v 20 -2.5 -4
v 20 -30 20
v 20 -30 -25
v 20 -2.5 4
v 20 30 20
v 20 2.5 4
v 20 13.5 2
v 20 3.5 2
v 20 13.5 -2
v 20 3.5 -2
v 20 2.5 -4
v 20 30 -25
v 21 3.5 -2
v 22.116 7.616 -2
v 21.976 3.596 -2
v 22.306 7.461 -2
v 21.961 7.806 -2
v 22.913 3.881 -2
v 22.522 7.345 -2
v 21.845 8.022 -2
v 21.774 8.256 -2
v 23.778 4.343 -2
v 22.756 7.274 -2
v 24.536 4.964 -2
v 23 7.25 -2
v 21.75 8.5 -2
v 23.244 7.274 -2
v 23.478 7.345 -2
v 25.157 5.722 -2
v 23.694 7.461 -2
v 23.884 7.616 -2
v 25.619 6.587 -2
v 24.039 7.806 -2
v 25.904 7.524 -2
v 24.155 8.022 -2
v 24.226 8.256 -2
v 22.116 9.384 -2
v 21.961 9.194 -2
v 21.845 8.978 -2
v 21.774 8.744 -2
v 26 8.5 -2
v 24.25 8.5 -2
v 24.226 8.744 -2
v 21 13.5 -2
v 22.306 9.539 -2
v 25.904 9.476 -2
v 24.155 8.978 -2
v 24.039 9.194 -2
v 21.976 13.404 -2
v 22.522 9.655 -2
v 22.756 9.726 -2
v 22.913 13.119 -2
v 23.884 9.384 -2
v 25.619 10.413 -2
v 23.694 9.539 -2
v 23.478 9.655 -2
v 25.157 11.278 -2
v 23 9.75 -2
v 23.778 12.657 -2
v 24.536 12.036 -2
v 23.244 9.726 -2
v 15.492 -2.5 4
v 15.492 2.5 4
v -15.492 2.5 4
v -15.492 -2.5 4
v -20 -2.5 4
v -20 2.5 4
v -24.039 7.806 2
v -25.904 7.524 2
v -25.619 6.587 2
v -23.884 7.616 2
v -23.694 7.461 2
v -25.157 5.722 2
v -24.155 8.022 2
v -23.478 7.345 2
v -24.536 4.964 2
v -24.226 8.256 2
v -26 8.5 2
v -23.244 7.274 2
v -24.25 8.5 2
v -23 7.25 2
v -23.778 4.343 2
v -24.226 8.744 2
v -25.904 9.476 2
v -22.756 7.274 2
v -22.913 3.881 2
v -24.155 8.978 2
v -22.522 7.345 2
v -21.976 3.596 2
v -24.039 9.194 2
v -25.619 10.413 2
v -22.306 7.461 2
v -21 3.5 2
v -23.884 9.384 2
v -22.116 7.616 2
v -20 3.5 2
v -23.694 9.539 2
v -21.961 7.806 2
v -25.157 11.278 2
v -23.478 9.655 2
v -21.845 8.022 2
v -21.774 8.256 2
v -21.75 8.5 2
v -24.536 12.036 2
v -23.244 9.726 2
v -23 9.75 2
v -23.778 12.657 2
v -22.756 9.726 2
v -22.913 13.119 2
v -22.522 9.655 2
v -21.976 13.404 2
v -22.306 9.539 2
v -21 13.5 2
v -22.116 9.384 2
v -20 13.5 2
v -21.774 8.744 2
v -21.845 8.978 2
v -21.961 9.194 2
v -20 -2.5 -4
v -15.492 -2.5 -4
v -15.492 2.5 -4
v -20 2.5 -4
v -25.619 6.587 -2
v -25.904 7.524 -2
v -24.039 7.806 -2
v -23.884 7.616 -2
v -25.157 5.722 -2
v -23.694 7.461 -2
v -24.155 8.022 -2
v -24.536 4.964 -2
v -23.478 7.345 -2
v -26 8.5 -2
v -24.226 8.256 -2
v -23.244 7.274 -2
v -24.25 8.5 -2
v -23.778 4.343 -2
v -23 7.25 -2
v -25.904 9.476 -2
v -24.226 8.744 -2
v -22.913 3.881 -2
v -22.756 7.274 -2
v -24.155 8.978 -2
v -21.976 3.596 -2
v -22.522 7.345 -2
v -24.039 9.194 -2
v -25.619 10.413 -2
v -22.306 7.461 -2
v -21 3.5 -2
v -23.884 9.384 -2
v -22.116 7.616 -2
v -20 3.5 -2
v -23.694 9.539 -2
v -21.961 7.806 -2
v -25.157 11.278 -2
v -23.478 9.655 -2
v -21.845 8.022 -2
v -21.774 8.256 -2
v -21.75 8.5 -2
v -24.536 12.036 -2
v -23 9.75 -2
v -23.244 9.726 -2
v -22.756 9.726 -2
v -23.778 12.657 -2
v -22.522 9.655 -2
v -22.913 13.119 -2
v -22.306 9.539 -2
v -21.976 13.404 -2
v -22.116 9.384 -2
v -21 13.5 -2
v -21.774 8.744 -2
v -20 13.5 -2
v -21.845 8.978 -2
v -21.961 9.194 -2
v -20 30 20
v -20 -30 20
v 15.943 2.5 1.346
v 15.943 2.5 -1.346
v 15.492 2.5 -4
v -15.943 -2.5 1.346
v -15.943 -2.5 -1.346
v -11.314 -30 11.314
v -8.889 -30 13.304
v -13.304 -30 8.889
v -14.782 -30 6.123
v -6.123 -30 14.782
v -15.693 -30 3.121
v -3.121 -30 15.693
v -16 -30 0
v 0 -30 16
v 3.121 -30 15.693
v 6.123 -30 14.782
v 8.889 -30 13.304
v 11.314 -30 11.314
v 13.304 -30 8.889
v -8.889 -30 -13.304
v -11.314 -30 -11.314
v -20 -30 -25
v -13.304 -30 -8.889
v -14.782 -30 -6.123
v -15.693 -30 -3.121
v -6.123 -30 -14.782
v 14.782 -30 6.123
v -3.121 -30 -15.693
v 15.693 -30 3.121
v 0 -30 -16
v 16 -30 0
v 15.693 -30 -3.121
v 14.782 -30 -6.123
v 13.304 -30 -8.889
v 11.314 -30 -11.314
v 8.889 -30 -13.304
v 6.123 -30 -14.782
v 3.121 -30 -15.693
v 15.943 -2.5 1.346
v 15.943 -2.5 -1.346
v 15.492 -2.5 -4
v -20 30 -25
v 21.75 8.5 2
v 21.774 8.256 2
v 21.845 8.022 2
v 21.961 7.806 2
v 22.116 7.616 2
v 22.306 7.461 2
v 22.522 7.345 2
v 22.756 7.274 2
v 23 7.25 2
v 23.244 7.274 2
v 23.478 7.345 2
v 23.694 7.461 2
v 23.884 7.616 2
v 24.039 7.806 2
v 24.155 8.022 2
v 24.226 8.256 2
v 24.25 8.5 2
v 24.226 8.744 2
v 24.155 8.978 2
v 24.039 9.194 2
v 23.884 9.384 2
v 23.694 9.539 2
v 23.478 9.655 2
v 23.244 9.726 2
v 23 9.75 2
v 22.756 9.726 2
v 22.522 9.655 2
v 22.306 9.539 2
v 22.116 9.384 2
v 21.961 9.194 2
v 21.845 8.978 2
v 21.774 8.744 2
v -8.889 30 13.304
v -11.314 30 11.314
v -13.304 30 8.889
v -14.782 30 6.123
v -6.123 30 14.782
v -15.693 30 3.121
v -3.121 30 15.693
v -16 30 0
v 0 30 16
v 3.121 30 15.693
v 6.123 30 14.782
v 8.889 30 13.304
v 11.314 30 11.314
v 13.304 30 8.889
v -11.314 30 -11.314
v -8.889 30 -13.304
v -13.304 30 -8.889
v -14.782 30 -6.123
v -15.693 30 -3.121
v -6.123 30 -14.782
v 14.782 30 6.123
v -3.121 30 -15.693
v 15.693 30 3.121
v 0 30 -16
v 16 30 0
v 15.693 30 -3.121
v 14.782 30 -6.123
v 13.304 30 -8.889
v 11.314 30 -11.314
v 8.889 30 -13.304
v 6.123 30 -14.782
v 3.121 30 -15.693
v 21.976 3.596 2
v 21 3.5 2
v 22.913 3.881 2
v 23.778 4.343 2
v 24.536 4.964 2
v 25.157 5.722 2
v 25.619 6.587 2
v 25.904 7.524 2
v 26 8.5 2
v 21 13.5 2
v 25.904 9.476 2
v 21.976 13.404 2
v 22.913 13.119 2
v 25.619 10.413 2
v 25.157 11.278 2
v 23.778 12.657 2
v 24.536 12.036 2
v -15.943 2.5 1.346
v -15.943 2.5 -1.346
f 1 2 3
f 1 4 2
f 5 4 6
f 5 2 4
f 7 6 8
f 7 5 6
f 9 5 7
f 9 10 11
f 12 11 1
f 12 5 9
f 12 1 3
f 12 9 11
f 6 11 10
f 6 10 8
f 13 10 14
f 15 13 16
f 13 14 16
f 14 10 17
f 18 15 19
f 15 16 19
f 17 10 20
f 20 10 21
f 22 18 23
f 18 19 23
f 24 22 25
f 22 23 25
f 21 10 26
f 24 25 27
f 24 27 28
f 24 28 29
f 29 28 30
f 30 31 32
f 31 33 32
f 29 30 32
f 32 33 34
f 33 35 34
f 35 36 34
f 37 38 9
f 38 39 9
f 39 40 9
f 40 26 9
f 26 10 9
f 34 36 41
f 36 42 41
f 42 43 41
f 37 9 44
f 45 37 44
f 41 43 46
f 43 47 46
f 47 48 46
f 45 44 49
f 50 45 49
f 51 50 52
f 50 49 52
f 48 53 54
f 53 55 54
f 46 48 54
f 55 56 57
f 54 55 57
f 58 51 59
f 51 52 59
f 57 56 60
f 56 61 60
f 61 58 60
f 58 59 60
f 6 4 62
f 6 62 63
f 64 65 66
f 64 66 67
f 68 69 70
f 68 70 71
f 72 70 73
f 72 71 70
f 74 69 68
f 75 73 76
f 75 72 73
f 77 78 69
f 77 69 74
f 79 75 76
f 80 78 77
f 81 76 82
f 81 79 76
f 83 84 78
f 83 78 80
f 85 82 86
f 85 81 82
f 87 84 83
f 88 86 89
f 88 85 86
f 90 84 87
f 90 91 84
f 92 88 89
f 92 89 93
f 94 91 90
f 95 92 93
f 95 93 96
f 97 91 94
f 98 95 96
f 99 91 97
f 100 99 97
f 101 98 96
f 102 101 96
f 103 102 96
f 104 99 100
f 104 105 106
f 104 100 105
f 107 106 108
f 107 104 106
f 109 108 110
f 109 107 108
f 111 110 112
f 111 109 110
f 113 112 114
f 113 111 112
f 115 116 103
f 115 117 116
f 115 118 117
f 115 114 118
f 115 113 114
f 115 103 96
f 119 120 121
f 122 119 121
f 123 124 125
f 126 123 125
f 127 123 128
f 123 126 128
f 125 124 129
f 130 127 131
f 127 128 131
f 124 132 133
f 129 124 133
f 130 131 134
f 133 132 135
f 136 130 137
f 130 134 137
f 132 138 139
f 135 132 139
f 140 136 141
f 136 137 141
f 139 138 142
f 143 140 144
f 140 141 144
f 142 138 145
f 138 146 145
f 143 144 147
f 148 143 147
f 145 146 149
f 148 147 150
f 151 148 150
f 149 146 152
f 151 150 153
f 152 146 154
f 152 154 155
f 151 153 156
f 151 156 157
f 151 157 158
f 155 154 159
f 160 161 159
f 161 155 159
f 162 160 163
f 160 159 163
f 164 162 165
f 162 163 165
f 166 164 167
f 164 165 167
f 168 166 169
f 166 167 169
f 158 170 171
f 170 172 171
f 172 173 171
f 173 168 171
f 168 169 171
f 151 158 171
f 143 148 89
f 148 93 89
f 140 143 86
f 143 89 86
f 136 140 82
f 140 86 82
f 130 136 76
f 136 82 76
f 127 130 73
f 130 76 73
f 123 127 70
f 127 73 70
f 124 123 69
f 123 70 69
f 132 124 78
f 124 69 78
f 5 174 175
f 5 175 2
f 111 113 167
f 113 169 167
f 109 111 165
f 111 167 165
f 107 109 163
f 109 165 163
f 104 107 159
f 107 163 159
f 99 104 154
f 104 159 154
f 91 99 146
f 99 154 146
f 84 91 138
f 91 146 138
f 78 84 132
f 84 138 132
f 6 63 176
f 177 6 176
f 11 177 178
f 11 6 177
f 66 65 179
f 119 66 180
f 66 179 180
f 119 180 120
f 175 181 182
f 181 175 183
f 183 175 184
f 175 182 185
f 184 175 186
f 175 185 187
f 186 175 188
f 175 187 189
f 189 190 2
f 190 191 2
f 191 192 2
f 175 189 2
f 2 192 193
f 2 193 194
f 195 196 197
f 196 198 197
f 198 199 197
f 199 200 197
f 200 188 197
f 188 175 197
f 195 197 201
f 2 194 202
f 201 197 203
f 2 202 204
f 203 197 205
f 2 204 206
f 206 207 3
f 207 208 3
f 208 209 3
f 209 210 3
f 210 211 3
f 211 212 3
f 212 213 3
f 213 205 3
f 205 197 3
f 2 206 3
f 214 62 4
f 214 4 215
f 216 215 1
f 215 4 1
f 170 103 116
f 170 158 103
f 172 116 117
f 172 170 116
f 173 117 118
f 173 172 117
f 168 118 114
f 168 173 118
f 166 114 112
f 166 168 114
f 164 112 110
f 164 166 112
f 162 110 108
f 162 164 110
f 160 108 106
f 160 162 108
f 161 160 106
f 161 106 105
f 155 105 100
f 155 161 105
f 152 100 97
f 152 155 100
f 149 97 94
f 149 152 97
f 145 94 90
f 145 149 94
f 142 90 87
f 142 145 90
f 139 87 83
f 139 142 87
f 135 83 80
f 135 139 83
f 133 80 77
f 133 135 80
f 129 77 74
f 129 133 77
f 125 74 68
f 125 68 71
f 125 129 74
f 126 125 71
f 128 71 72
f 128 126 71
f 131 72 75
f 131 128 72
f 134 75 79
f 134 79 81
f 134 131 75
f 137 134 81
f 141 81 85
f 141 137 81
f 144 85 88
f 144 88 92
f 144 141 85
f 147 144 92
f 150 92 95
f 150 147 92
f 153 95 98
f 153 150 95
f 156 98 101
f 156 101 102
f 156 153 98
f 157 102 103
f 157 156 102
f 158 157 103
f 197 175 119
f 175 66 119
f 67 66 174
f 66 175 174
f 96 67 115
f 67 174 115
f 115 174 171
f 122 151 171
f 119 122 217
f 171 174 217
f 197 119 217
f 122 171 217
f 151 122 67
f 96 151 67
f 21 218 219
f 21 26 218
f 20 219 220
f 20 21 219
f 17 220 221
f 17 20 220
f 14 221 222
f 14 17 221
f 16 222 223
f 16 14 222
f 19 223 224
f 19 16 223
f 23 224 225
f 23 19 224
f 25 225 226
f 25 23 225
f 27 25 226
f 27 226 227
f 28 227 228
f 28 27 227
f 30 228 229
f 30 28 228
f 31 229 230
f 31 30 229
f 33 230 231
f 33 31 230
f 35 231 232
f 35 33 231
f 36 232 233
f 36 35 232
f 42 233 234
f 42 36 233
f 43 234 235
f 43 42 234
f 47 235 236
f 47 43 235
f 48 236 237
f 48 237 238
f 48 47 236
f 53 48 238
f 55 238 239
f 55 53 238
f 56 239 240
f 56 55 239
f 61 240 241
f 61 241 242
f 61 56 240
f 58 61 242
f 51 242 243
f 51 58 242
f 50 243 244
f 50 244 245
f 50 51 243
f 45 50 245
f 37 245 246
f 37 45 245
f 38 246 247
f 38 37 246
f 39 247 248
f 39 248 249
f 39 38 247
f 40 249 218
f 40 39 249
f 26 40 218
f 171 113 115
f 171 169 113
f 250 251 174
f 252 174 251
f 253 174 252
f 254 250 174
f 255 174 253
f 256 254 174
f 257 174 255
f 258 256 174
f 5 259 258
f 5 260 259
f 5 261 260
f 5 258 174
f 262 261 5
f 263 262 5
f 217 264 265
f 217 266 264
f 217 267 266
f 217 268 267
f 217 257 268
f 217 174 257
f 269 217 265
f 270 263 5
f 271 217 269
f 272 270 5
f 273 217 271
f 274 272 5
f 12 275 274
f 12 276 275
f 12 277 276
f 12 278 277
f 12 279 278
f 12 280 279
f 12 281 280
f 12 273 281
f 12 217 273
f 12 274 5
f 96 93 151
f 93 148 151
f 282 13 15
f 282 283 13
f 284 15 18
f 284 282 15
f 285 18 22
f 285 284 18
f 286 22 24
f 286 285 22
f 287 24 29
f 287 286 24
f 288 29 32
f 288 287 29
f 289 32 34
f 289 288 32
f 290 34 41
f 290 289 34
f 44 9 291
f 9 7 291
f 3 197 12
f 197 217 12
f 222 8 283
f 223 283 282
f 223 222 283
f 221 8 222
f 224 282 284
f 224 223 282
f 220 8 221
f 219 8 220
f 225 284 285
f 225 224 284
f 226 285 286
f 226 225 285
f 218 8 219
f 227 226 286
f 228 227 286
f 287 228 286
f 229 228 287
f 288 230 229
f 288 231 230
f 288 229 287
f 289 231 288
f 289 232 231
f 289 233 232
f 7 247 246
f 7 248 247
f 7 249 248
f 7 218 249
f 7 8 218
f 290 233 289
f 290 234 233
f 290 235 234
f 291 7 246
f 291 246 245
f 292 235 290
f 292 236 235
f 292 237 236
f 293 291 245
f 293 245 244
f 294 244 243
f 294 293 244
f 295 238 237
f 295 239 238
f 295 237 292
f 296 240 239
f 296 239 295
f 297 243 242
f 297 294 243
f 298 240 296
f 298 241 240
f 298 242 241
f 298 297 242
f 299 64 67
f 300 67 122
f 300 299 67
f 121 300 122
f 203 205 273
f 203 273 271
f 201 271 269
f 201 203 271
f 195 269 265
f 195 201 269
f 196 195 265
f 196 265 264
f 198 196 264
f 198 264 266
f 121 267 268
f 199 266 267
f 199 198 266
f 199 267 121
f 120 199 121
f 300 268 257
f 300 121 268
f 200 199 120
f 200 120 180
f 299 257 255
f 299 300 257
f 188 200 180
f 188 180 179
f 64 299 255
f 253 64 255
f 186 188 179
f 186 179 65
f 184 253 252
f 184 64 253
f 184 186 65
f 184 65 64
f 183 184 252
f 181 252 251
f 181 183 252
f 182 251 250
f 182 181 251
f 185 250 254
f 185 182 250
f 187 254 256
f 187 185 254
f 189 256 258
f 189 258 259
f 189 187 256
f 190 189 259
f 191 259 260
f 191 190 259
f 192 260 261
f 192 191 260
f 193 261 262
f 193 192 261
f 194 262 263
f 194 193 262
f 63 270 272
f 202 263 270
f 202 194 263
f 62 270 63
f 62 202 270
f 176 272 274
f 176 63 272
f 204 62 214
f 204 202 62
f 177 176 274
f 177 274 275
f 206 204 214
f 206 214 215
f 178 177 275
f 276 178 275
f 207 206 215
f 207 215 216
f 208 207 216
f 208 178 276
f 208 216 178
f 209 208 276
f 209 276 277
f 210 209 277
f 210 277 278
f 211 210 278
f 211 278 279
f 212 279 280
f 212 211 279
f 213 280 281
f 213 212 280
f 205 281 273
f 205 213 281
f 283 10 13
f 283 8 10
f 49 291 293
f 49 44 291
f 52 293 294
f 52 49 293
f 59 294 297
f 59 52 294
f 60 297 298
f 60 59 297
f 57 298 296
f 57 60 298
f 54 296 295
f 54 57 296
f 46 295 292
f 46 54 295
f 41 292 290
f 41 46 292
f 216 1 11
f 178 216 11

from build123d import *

# Parameters (mm, degrees)
CROQUIS1_W              = 40
CROQUIS1_H              = 45
CROQUIS1_R              = 16
SALIENTE_EXTRUIR1_DEPTH = 30
CROQUIS3_W              = 8
CROQUIS3_H              = 5
CORTAR_EXTRUIR1_DEPTH   = 40
CROQUIS4_W              = 6
CROQUIS4_H              = 10
CROQUIS4_R              = 1.25
SALIENTE_EXTRUIR2_DEPTH = 2
REDONDEO1_R             = 5


with BuildPart() as part:
    # Croquis1 → Saliente-Extruir1 (new, symmetric)
    with BuildSketch(Plane(origin=(0, 0, 0), x_dir=(1, 0, 0), z_dir=(0, 1, 0))):
        with Locations((0, 2.5)):
            Rectangle(CROQUIS1_W, CROQUIS1_H)
        with Locations(Location((0, 0, 0), (0, 0, 90))):
            Circle(CROQUIS1_R, mode=Mode.SUBTRACT)
    extrude(amount=SALIENTE_EXTRUIR1_DEPTH, both=True)

    # Croquis3 → Cortar-Extruir1 (cut, symmetric)
    with BuildSketch(Plane(origin=(0, 0, 0), x_dir=(0, 0, -1), z_dir=(1, 0, 0))):
        Rectangle(CROQUIS3_W, CROQUIS3_H)
    extrude(amount=CORTAR_EXTRUIR1_DEPTH, both=True, mode=Mode.SUBTRACT)

    # Croquis4 → Saliente-Extruir2 (add, symmetric)
    # profile 1 of 2: a face of its own
    with BuildSketch(Plane.XY):
        with Locations((-23, 8.5)):
            Rectangle(CROQUIS4_W, CROQUIS4_H)
        with Locations((-23, 8.5)):
            Circle(CROQUIS4_R, mode=Mode.SUBTRACT)
    # profile 2 of 2: a face of its own
    with BuildSketch(Plane.XY):
        with Locations((23, 8.5)):
            Rectangle(CROQUIS4_W, CROQUIS4_H)
        with Locations(Location((23, 8.5, 0), (0, 0, 180))):
            Circle(CROQUIS4_R, mode=Mode.SUBTRACT)
    extrude(amount=SALIENTE_EXTRUIR2_DEPTH, both=True)

    # Redondeo1
    redondeo1_edges = [part.edges().sort_by_distance(p)[0] for p in [
        (26, 3.5, 0),
        (26, 13.5, 0),
        (-26, 3.5, 0),
        (-26, 13.5, 0),
    ]]
    fillet(redondeo1_edges, radius=REDONDEO1_R - 0.0001)  # a hair under: the kernel refuses the full size


solid = part.part
